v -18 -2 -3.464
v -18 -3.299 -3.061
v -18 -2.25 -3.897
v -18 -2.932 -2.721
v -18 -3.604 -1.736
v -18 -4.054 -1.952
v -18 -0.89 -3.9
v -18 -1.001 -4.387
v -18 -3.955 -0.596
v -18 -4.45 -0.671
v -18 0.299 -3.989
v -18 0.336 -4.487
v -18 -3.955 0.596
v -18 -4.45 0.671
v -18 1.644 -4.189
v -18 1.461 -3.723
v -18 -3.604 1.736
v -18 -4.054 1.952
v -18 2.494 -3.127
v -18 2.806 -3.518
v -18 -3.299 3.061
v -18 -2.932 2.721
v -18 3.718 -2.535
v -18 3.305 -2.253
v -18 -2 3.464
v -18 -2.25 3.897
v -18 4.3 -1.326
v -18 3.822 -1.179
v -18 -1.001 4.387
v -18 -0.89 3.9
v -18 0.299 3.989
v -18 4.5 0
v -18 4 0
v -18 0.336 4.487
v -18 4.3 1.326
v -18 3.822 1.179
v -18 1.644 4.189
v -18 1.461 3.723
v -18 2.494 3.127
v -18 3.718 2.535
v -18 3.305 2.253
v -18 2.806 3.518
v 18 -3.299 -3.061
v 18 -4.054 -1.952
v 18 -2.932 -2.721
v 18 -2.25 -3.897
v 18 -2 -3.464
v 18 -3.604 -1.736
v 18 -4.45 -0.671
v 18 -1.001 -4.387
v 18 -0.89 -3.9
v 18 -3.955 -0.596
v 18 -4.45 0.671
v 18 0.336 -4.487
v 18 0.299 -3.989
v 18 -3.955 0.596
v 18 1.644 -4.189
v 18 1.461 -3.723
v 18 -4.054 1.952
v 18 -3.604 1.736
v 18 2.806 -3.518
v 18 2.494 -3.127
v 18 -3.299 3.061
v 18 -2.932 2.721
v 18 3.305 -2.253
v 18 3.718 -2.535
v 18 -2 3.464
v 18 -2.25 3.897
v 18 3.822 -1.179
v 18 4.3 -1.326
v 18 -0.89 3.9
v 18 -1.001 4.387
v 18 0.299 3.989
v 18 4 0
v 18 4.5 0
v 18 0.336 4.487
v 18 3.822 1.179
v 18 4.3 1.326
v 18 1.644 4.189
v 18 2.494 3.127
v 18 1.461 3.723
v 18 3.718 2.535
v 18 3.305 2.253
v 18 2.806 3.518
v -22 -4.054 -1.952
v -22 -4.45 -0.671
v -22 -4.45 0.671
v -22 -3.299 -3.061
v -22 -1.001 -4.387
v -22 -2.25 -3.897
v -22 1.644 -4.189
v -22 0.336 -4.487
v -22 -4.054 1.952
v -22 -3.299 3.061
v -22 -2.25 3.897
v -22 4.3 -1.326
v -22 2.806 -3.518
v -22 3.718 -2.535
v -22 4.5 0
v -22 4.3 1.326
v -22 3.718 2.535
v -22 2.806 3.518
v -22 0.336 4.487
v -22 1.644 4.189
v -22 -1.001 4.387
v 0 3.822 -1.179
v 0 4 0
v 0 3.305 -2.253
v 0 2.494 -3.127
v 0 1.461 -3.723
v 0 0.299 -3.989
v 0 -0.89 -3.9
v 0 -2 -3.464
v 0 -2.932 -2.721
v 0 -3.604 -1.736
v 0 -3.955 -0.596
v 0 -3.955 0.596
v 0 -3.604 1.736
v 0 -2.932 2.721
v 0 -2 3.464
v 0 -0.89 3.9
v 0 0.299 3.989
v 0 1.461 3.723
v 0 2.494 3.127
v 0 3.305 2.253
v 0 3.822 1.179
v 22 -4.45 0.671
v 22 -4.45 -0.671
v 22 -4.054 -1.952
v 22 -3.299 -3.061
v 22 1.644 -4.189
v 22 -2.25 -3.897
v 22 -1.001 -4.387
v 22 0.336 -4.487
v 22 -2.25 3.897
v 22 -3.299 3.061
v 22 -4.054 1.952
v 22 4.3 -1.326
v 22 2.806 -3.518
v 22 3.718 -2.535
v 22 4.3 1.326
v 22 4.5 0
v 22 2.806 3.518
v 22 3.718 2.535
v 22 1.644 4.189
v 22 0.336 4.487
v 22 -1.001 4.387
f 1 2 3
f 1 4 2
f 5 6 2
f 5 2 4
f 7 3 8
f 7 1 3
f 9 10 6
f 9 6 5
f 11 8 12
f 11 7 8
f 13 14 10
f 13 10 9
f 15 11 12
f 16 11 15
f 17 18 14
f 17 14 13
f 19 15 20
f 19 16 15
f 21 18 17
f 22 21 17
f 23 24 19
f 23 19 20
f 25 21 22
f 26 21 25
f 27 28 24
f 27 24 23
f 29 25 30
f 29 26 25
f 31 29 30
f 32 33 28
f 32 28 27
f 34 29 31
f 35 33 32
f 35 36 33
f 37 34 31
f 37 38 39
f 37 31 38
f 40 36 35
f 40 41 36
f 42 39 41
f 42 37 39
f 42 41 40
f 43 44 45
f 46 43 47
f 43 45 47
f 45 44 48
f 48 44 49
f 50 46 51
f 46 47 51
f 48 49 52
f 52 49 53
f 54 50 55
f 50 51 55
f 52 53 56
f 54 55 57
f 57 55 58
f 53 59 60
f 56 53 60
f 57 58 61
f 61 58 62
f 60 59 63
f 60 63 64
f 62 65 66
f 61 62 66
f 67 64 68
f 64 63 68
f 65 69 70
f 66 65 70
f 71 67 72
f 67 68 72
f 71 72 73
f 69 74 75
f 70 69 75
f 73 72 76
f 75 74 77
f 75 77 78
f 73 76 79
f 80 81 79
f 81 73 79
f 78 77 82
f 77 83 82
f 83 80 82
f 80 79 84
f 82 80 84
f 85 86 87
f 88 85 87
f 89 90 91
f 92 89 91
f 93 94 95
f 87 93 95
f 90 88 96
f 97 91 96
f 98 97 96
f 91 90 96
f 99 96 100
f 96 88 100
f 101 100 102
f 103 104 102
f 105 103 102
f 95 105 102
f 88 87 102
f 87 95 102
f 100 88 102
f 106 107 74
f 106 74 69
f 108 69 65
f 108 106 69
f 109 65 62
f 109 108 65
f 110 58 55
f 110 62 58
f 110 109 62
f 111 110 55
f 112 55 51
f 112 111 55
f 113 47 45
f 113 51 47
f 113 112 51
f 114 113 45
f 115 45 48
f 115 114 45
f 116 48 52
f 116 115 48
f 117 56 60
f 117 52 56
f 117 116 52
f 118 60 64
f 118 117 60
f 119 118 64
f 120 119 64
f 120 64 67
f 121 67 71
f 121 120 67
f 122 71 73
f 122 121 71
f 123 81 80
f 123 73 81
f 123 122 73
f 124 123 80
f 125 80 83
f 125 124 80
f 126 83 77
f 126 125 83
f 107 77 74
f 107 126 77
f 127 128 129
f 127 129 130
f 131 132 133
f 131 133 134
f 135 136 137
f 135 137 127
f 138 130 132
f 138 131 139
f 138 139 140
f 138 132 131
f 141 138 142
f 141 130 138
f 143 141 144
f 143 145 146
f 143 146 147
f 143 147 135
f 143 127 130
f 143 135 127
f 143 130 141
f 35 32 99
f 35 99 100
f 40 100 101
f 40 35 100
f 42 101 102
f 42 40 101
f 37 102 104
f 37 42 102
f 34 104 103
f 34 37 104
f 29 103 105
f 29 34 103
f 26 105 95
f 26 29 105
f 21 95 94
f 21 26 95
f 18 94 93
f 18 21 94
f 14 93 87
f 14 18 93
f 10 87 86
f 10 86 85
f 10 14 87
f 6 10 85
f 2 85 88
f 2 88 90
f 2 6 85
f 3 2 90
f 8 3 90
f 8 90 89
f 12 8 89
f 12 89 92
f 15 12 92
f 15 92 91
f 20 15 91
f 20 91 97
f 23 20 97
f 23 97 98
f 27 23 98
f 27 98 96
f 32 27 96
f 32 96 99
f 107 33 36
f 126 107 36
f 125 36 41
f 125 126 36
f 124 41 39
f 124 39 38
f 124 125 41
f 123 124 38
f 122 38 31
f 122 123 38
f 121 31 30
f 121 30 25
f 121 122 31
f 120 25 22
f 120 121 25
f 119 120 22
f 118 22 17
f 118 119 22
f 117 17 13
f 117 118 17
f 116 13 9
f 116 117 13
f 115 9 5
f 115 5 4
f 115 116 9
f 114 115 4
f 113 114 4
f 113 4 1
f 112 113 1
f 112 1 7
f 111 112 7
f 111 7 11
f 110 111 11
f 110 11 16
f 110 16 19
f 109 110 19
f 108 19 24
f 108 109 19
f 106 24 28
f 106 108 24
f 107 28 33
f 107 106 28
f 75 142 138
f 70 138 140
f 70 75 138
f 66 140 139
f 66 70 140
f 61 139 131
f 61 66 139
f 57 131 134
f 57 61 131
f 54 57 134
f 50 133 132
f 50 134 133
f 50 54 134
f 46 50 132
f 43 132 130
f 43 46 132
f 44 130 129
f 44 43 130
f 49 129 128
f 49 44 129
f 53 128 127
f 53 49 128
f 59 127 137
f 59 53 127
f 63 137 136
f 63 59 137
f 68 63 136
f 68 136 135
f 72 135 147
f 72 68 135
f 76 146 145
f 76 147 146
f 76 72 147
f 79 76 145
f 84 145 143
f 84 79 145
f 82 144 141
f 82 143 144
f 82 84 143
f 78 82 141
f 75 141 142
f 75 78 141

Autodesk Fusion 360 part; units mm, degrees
sketch "Sketch1" plane through (0, 0, 0) normal (1, 0, 0) x (0, 1, 0)
  circle A0 centre (0, 0) radius 4.5
  dimension "d1" = 9
extrude "Extrude1" add sketch "Sketch1" along normal mid plane 44
sketch "Sketch3" plane through (0, 0, 0) normal (1, 0, 0) x (0, 1, 0)
  circle A0 centre (0, 0) radius 4
  circle A1 centre (0, 0) radius 5
  dimension "d7" = 8
  dimension "d8" = 10
extrude "Extrude2" cut sketch "Sketch3" along normal mid plane 36
